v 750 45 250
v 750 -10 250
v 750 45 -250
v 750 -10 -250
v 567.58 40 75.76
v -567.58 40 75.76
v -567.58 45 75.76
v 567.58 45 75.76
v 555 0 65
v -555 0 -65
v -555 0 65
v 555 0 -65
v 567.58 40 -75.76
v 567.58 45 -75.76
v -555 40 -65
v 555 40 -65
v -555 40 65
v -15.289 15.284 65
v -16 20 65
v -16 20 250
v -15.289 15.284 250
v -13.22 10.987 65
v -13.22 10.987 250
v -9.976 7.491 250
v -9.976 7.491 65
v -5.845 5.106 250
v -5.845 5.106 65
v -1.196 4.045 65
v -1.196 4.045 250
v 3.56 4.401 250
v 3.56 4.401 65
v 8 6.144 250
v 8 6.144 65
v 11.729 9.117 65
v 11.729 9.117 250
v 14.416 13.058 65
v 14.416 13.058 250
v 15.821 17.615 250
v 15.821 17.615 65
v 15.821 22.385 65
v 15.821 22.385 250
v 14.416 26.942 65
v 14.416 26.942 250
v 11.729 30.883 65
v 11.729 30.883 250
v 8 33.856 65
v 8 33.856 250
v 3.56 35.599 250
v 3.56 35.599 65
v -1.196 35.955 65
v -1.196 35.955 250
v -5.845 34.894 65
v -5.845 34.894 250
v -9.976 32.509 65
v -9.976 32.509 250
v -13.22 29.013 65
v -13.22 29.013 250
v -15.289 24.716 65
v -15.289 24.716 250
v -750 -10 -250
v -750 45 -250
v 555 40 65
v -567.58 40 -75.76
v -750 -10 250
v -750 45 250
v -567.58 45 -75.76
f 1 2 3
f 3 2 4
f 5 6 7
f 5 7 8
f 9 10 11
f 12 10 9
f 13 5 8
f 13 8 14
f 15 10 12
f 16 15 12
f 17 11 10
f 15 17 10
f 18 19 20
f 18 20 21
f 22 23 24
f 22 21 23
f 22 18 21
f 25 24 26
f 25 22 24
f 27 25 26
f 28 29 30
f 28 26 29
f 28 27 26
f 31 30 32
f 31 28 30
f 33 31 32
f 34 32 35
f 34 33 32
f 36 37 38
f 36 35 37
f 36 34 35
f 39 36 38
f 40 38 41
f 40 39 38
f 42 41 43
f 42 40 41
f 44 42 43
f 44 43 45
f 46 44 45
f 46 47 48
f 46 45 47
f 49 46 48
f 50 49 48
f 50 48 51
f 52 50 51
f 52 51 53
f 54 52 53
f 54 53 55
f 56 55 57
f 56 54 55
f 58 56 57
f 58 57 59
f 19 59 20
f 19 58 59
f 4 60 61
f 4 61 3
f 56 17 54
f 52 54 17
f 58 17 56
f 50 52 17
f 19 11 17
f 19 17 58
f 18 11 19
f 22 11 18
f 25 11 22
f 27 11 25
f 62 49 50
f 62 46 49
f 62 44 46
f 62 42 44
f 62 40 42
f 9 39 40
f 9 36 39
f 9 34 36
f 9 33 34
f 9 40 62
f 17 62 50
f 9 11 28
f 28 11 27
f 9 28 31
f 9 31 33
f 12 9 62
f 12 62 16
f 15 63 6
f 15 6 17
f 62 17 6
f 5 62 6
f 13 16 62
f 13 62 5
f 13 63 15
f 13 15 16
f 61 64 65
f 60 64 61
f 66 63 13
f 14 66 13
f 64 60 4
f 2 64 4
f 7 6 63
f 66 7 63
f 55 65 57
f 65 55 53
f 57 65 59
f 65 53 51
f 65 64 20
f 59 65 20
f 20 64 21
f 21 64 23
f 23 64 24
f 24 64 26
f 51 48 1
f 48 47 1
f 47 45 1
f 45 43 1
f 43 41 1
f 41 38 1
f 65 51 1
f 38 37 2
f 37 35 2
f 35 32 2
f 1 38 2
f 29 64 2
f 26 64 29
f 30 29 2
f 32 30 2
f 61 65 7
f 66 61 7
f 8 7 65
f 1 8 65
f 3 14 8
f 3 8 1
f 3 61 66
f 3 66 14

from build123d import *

# Parameters (mm, degrees)
SKETCH19_W               = 1135.16
SKETCH19_H               = 151.52
SKETCH19_W_2             = 1110
SKETCH19_H_2             = 130
BOSS_EXTRUDE2_DEPTH      = 40
SKETCH22_W               = 1135.16
SKETCH22_H               = 151.52
BOSS_EXTRUDE3_DEPTH      = 10
BOSS_EXTRUDE4_DEPTH      = 45
BOSS_EXTRUDE4_DEPTH_BACK = 10
SKETCH23_W               = 1500
SKETCH23_H               = 500
SKETCH23_W_2             = 1135.16
SKETCH23_H_2             = 151.52
SKETCH21_R               = 16
CUT_EXTRUDE5_DEPTH       = 792.849101786


with BuildPart() as part:
    # Sketch19 → Boss-Extrude2 (new body)
    with BuildSketch(Plane(origin=(0, 0, 0), x_dir=(1, 0, 0), z_dir=(0, 1, 0))):
        Rectangle(SKETCH19_W, SKETCH19_H)
        Rectangle(SKETCH19_W_2, SKETCH19_H_2, mode=Mode.SUBTRACT)
    extrude(amount=BOSS_EXTRUDE2_DEPTH)

    # Sketch22 → Boss-Extrude3 (add)
    with BuildSketch(Plane(origin=(0, 0, 0), x_dir=(1, 0, 0), z_dir=(0, 1, 0))):
        Rectangle(SKETCH22_W, SKETCH22_H)
    extrude(amount=-BOSS_EXTRUDE3_DEPTH)

    # Sketch23 → Boss-Extrude4 (add, two sides: drawn at the far end of the back side and taken through both)
    with BuildSketch(Plane(origin=(0, 0, 0), x_dir=(1, 0, 0), z_dir=(0, 1, 0)).offset(-BOSS_EXTRUDE4_DEPTH_BACK)):
        Rectangle(SKETCH23_W, SKETCH23_H)
        Rectangle(SKETCH23_W_2, SKETCH23_H_2, mode=Mode.SUBTRACT)
    extrude(amount=BOSS_EXTRUDE4_DEPTH + BOSS_EXTRUDE4_DEPTH_BACK)

    # Sketch21 → Cut-Extrude5 (cut, through all)
    with BuildSketch(Plane.XY):
        with Locations(Location((0, 20, 0), (0, 0, 180))):
            Circle(SKETCH21_R)
    extrude(amount=CUT_EXTRUDE5_DEPTH, mode=Mode.SUBTRACT)


solid = part.part
